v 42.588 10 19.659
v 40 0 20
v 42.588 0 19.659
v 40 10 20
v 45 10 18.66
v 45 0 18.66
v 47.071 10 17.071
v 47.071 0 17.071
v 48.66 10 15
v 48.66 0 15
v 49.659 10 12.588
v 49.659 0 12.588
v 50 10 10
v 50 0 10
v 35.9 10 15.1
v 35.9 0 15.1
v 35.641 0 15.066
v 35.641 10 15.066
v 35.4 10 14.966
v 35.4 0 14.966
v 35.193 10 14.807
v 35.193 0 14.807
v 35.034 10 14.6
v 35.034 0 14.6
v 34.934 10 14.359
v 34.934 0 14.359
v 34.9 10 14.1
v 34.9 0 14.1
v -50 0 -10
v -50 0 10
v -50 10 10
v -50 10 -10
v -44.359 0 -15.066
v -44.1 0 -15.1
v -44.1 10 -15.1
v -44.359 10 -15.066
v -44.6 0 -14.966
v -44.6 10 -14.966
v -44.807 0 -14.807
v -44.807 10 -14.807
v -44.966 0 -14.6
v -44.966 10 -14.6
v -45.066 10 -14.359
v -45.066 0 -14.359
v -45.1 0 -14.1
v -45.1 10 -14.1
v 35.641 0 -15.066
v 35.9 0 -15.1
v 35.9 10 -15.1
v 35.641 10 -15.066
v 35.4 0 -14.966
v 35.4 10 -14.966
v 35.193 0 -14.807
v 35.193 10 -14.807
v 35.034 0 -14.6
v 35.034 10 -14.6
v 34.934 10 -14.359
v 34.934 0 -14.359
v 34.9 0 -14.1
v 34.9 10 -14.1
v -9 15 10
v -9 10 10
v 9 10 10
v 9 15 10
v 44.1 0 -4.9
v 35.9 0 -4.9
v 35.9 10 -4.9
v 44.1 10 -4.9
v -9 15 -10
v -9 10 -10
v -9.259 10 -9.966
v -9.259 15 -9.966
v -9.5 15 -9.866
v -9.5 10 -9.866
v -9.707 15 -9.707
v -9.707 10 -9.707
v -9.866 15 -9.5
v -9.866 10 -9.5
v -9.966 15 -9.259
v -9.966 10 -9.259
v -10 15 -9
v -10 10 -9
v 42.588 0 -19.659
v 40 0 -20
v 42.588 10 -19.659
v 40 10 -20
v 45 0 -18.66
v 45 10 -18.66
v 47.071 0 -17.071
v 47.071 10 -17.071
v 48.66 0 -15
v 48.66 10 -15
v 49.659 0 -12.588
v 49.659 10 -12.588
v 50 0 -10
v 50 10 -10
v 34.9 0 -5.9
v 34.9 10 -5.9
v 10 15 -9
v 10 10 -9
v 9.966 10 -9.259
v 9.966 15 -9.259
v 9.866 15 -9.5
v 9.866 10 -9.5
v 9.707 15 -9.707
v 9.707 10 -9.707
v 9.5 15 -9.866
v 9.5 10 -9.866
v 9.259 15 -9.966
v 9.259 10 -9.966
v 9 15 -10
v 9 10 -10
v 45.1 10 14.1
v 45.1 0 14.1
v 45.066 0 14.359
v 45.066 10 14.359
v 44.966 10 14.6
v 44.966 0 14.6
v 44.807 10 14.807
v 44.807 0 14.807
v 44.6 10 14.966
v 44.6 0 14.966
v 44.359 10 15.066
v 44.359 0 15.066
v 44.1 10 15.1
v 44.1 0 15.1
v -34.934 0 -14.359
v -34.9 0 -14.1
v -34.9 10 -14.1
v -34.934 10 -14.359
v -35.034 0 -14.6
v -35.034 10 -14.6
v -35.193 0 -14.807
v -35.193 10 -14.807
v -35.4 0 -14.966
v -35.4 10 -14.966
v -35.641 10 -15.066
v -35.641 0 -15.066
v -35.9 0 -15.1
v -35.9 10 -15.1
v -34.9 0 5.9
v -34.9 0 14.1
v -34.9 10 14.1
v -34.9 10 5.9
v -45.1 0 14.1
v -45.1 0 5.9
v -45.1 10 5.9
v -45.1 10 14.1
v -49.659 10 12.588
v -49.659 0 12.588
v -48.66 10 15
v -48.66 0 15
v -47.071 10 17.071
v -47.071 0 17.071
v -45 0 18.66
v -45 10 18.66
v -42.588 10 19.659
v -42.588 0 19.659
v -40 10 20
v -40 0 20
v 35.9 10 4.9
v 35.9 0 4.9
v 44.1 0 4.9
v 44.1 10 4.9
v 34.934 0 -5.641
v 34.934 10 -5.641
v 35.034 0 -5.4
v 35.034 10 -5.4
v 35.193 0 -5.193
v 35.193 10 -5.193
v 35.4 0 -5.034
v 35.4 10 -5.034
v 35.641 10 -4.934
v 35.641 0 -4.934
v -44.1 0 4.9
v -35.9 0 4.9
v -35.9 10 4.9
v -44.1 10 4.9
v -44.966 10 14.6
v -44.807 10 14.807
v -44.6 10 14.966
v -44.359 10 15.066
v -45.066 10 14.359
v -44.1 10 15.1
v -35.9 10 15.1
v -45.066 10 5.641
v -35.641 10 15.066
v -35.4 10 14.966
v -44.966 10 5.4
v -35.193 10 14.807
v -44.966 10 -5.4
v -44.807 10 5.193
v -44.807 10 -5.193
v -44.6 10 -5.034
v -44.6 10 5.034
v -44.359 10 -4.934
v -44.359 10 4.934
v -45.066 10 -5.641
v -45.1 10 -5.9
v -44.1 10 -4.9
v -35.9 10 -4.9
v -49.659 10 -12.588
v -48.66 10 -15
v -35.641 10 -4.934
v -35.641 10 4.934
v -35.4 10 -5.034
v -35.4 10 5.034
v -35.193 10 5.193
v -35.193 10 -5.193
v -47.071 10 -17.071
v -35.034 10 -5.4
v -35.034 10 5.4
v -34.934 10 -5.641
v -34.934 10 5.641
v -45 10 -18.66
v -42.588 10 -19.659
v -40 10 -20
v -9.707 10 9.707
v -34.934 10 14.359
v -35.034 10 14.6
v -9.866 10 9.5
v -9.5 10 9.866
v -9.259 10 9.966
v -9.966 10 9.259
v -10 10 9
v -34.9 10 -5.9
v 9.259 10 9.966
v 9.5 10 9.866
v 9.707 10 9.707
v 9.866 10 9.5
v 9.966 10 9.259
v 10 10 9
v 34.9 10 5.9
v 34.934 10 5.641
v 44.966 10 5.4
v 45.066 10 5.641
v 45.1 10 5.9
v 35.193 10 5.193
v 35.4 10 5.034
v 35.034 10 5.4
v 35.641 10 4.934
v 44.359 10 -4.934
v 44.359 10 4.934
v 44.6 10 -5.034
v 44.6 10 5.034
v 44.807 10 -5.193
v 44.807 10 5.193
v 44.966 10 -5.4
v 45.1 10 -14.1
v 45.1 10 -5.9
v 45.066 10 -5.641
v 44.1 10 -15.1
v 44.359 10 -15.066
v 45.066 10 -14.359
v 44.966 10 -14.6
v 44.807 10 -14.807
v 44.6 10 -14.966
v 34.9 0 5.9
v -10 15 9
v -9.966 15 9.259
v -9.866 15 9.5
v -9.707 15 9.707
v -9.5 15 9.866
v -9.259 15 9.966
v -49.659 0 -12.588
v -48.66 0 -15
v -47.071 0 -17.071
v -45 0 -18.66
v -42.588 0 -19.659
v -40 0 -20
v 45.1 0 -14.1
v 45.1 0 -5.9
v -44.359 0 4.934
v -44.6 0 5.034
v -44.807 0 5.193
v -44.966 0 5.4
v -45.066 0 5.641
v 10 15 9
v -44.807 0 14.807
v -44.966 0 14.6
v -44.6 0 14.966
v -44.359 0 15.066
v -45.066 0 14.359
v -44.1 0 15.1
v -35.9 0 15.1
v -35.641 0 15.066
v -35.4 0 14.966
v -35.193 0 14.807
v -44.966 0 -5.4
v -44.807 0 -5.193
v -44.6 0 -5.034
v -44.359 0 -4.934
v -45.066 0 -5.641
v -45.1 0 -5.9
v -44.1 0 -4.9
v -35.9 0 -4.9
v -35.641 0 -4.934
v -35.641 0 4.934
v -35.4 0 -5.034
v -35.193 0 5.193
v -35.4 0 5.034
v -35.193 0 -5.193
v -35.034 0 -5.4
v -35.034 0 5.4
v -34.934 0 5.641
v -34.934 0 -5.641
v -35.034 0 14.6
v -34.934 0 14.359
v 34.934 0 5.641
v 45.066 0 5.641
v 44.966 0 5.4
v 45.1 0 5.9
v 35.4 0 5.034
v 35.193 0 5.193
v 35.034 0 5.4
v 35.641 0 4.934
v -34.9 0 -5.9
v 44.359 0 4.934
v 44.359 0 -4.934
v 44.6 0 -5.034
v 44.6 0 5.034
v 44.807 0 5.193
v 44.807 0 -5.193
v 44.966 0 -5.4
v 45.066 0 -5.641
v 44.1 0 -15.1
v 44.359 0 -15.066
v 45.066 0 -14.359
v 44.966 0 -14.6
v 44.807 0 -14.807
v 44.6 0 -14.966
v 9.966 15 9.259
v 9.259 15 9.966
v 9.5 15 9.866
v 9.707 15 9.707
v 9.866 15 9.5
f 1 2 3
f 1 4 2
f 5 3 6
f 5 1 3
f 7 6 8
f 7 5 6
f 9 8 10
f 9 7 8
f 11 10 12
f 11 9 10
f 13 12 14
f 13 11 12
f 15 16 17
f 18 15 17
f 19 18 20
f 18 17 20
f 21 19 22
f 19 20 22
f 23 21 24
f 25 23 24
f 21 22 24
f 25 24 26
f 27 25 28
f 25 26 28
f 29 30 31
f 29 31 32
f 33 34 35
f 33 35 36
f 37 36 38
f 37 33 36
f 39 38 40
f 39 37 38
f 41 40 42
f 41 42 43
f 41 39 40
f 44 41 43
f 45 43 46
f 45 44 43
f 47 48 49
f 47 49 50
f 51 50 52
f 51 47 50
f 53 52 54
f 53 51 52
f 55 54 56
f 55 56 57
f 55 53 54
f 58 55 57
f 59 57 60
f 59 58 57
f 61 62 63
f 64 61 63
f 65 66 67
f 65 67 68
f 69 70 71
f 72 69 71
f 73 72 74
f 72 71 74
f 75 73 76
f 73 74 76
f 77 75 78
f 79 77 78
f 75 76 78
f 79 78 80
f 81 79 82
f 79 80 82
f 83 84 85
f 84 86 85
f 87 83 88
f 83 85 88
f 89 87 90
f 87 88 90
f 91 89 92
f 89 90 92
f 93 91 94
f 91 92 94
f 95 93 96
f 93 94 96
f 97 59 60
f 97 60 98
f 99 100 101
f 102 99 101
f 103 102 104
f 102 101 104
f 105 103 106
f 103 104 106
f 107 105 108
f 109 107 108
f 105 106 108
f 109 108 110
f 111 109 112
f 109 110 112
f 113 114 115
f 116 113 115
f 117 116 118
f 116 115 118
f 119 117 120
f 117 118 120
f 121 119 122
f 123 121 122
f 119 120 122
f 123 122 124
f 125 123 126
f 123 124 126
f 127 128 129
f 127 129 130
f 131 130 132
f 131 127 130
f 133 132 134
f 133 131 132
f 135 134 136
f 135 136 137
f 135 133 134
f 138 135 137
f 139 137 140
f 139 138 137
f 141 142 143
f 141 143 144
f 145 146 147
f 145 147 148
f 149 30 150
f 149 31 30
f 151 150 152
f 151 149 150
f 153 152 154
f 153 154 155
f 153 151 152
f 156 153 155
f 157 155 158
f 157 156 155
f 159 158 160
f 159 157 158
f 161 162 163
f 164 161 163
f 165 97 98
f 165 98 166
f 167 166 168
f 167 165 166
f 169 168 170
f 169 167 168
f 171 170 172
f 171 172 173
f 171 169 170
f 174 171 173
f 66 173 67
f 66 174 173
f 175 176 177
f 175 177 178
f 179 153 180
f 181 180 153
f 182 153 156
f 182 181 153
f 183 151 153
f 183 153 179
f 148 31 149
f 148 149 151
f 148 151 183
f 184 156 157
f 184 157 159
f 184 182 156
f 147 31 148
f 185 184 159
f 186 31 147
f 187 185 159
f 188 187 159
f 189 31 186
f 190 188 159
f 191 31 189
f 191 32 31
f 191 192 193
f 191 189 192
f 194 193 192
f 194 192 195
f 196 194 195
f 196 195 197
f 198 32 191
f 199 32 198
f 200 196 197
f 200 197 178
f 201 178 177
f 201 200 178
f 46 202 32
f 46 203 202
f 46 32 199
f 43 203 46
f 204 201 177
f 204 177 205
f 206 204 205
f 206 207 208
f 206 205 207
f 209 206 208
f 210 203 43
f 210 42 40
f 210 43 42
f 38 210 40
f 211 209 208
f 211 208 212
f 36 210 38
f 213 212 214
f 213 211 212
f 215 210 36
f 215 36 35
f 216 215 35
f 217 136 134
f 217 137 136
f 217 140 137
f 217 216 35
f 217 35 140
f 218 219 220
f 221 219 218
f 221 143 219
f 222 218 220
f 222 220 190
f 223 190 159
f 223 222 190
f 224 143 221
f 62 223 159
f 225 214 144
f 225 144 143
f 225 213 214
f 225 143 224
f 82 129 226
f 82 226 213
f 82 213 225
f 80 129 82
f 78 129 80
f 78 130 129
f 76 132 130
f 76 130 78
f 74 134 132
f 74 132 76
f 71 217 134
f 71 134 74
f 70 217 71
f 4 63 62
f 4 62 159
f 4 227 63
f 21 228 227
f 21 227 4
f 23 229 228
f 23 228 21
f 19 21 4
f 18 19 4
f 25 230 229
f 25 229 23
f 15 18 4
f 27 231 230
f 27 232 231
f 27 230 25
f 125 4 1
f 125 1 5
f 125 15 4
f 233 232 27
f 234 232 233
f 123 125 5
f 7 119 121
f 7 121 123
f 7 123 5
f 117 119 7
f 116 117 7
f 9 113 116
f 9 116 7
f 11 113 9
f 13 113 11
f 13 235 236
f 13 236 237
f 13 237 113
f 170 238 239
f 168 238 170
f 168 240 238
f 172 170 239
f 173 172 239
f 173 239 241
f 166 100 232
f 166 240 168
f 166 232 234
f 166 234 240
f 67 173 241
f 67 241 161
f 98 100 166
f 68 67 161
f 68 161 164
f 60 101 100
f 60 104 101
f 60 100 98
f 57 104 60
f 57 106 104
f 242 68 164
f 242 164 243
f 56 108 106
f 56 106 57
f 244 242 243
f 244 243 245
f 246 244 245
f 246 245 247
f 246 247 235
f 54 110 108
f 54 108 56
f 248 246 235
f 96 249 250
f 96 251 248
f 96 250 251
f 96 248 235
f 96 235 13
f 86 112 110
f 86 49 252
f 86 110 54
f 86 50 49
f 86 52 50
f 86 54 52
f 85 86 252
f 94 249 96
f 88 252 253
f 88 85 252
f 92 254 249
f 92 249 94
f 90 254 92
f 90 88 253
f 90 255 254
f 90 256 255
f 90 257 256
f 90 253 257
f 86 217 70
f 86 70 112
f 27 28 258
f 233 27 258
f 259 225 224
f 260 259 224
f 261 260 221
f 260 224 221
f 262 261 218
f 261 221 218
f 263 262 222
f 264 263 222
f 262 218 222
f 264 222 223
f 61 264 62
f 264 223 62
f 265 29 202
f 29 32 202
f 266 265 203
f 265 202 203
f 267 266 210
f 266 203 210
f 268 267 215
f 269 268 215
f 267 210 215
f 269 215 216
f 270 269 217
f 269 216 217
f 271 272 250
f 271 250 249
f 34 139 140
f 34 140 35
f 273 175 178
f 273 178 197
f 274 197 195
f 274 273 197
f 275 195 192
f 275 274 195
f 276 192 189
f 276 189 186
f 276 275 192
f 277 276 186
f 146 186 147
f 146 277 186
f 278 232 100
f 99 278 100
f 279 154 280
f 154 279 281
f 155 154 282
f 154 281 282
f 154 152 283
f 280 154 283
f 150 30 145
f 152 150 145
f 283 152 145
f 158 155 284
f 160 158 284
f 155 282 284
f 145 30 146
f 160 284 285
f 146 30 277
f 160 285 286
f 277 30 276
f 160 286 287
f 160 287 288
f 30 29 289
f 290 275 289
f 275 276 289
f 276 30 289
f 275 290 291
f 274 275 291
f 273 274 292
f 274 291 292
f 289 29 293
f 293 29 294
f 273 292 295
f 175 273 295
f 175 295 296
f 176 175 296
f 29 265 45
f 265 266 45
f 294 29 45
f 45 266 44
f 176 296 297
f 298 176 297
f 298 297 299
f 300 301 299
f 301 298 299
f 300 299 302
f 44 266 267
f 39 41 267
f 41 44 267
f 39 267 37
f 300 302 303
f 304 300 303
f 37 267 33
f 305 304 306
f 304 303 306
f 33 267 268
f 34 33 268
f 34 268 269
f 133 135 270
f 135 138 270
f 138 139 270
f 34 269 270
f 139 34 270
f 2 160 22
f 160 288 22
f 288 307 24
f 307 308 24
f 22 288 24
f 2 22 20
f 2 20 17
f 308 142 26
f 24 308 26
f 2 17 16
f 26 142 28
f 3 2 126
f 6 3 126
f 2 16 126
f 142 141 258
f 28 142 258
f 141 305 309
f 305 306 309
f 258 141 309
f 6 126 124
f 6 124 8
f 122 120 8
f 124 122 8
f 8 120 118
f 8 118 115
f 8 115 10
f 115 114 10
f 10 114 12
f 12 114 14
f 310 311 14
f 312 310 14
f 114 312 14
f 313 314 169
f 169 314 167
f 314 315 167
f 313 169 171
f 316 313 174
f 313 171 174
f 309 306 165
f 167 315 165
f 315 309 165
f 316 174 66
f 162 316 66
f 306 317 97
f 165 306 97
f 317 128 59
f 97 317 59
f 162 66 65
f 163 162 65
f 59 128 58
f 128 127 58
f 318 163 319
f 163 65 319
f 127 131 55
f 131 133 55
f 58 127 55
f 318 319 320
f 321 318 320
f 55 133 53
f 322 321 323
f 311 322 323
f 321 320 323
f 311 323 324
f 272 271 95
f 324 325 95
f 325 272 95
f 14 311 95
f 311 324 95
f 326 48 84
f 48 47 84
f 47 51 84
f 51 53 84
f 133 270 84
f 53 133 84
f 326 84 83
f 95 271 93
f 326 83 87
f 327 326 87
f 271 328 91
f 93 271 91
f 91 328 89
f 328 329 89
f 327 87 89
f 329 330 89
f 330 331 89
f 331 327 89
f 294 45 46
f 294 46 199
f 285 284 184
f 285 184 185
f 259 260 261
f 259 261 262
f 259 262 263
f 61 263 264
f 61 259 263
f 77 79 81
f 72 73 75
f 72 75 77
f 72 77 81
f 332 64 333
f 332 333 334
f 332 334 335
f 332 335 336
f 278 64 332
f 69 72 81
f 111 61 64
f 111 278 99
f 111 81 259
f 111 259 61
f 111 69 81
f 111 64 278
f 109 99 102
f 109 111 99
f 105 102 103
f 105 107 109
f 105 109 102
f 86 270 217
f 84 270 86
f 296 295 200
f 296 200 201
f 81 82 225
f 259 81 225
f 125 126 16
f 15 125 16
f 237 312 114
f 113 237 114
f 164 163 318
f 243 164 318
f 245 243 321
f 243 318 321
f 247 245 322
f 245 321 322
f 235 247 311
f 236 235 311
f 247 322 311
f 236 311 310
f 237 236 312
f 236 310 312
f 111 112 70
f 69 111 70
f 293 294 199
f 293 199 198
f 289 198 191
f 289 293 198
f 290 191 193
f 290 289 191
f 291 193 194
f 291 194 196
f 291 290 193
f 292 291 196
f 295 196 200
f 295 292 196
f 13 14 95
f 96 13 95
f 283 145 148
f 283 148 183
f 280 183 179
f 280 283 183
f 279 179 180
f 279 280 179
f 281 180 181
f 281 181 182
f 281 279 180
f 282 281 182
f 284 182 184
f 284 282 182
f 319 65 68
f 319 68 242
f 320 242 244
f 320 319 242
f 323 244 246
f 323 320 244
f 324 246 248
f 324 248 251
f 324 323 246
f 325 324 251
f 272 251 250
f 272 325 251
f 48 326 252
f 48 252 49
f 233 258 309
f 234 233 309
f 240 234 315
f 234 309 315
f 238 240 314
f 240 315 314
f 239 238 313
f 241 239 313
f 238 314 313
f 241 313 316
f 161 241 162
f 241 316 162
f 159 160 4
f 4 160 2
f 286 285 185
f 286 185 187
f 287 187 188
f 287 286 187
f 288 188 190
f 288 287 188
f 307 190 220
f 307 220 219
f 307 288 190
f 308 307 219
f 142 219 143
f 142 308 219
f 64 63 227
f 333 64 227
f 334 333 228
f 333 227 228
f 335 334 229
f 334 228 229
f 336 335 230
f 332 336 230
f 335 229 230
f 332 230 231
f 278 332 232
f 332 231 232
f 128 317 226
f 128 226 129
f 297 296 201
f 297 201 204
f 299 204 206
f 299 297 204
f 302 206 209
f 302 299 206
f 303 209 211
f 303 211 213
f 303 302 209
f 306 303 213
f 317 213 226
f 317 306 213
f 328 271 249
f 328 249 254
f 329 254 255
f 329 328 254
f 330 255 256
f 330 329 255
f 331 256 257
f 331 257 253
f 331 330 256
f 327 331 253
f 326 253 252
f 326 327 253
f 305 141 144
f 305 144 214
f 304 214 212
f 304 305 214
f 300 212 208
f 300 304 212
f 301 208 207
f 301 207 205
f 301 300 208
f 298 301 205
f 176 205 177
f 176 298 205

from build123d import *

# Parameters (mm, degrees)
SKETCH_1_W      = 100
SKETCH_1_H      = 40
EXTRUDE_1_DEPTH = 10
FILLET_1_R      = 10
EXTRUDE_2_DEPTH = 5


with BuildPart() as part:
    # ｽｹｯﾁ1 → ﾎﾞｽ - 押し出し1 (new body)
    with BuildSketch(Plane(origin=(0, 0, 0), x_dir=(1, 0, 0), z_dir=(0, 1, 0))):
        Rectangle(SKETCH_1_W, SKETCH_1_H)
        with BuildLine():
            Line((44.1, 15.1), (35.9, 15.1))
            ThreePointArc((35.9, 15.1), (35.192893219, 14.807106781), (34.9, 14.1))
            Line((34.9, 14.1), (34.9, 5.9))
            ThreePointArc((34.9, 5.9), (35.192893219, 5.192893219), (35.9, 4.9))
            Line((35.9, 4.9), (44.1, 4.9))
            ThreePointArc((44.1, 4.9), (44.807106781, 5.192893219), (45.1, 5.9))
            Line((45.1, 5.9), (45.1, 14.1))
            ThreePointArc((45.1, 14.1), (44.807106781, 14.807106781), (44.1, 15.1))
        make_face(mode=Mode.SUBTRACT)
        with BuildLine():
            Line((-44.1, 4.9), (-35.9, 4.9))
            ThreePointArc((-35.9, 4.9), (-35.192893219, 5.192893219), (-34.9, 5.9))
            Line((-34.9, 5.9), (-34.9, 14.1))
            ThreePointArc((-34.9, 14.1), (-35.192893219, 14.807106781), (-35.9, 15.1))
            Line((-35.9, 15.1), (-44.1, 15.1))
            ThreePointArc((-44.1, 15.1), (-44.807106781, 14.807106781), (-45.1, 14.1))
            Line((-45.1, 14.1), (-45.1, 5.9))
            ThreePointArc((-45.1, 5.9), (-44.807106781, 5.192893219), (-44.1, 4.9))
        make_face(mode=Mode.SUBTRACT)
        with BuildLine():
            Line((45.1, -5.9), (45.1, -14.1))
            ThreePointArc((45.1, -14.1), (44.807106781, -14.807106781), (44.1, -15.1))
            Line((44.1, -15.1), (35.9, -15.1))
            ThreePointArc((35.9, -15.1), (35.192893219, -14.807106781), (34.9, -14.1))
            Line((34.9, -14.1), (34.9, -5.9))
            ThreePointArc((34.9, -5.9), (35.192893219, -5.192893219), (35.9, -4.9))
            Line((35.9, -4.9), (44.1, -4.9))
            ThreePointArc((44.1, -4.9), (44.807106781, -5.192893219), (45.1, -5.9))
        make_face(mode=Mode.SUBTRACT)
        with BuildLine():
            Line((-44.1, -15.1), (-35.9, -15.1))
            ThreePointArc((-35.9, -15.1), (-35.192893219, -14.807106781), (-34.9, -14.1))
            Line((-34.9, -14.1), (-34.9, -5.9))
            ThreePointArc((-34.9, -5.9), (-35.192893219, -5.192893219), (-35.9, -4.9))
            Line((-35.9, -4.9), (-44.1, -4.9))
            ThreePointArc((-44.1, -4.9), (-44.807106781, -5.192893219), (-45.1, -5.9))
            Line((-45.1, -5.9), (-45.1, -14.1))
            ThreePointArc((-45.1, -14.1), (-44.807106781, -14.807106781), (-44.1, -15.1))
        make_face(mode=Mode.SUBTRACT)
    extrude(amount=EXTRUDE_1_DEPTH)

    # ﾌｨﾚｯﾄ1
    fillet_1_edges = [part.edges().sort_by_distance(p)[0] for p in [
        (50, 5, 20),
        (-50, 5, 20),
        (-50, 5, -20),
        (50, 5, -20),
    ]]
    fillet(fillet_1_edges, radius=FILLET_1_R)

    # ｽｹｯﾁ2 → ﾎﾞｽ - 押し出し2 (add)
    with BuildSketch(Plane(origin=(0, 10, 0), x_dir=(1, 0, 0), z_dir=(0, 1, 0))):
        with BuildLine():
            Line((-9, -10), (9, -10))
            ThreePointArc((9, -10), (9.707106781, -9.707106781), (10, -9))
            Line((10, -9), (10, 9))
            ThreePointArc((10, 9), (9.707106781, 9.707106781), (9, 10))
            Line((9, 10), (-9, 10))
            ThreePointArc((-9, 10), (-9.707106781, 9.707106781), (-10, 9))
            Line((-10, 9), (-10, -9))
            ThreePointArc((-10, -9), (-9.707106781, -9.707106781), (-9, -10))
        make_face()
    extrude(amount=EXTRUDE_2_DEPTH)


solid = part.part
